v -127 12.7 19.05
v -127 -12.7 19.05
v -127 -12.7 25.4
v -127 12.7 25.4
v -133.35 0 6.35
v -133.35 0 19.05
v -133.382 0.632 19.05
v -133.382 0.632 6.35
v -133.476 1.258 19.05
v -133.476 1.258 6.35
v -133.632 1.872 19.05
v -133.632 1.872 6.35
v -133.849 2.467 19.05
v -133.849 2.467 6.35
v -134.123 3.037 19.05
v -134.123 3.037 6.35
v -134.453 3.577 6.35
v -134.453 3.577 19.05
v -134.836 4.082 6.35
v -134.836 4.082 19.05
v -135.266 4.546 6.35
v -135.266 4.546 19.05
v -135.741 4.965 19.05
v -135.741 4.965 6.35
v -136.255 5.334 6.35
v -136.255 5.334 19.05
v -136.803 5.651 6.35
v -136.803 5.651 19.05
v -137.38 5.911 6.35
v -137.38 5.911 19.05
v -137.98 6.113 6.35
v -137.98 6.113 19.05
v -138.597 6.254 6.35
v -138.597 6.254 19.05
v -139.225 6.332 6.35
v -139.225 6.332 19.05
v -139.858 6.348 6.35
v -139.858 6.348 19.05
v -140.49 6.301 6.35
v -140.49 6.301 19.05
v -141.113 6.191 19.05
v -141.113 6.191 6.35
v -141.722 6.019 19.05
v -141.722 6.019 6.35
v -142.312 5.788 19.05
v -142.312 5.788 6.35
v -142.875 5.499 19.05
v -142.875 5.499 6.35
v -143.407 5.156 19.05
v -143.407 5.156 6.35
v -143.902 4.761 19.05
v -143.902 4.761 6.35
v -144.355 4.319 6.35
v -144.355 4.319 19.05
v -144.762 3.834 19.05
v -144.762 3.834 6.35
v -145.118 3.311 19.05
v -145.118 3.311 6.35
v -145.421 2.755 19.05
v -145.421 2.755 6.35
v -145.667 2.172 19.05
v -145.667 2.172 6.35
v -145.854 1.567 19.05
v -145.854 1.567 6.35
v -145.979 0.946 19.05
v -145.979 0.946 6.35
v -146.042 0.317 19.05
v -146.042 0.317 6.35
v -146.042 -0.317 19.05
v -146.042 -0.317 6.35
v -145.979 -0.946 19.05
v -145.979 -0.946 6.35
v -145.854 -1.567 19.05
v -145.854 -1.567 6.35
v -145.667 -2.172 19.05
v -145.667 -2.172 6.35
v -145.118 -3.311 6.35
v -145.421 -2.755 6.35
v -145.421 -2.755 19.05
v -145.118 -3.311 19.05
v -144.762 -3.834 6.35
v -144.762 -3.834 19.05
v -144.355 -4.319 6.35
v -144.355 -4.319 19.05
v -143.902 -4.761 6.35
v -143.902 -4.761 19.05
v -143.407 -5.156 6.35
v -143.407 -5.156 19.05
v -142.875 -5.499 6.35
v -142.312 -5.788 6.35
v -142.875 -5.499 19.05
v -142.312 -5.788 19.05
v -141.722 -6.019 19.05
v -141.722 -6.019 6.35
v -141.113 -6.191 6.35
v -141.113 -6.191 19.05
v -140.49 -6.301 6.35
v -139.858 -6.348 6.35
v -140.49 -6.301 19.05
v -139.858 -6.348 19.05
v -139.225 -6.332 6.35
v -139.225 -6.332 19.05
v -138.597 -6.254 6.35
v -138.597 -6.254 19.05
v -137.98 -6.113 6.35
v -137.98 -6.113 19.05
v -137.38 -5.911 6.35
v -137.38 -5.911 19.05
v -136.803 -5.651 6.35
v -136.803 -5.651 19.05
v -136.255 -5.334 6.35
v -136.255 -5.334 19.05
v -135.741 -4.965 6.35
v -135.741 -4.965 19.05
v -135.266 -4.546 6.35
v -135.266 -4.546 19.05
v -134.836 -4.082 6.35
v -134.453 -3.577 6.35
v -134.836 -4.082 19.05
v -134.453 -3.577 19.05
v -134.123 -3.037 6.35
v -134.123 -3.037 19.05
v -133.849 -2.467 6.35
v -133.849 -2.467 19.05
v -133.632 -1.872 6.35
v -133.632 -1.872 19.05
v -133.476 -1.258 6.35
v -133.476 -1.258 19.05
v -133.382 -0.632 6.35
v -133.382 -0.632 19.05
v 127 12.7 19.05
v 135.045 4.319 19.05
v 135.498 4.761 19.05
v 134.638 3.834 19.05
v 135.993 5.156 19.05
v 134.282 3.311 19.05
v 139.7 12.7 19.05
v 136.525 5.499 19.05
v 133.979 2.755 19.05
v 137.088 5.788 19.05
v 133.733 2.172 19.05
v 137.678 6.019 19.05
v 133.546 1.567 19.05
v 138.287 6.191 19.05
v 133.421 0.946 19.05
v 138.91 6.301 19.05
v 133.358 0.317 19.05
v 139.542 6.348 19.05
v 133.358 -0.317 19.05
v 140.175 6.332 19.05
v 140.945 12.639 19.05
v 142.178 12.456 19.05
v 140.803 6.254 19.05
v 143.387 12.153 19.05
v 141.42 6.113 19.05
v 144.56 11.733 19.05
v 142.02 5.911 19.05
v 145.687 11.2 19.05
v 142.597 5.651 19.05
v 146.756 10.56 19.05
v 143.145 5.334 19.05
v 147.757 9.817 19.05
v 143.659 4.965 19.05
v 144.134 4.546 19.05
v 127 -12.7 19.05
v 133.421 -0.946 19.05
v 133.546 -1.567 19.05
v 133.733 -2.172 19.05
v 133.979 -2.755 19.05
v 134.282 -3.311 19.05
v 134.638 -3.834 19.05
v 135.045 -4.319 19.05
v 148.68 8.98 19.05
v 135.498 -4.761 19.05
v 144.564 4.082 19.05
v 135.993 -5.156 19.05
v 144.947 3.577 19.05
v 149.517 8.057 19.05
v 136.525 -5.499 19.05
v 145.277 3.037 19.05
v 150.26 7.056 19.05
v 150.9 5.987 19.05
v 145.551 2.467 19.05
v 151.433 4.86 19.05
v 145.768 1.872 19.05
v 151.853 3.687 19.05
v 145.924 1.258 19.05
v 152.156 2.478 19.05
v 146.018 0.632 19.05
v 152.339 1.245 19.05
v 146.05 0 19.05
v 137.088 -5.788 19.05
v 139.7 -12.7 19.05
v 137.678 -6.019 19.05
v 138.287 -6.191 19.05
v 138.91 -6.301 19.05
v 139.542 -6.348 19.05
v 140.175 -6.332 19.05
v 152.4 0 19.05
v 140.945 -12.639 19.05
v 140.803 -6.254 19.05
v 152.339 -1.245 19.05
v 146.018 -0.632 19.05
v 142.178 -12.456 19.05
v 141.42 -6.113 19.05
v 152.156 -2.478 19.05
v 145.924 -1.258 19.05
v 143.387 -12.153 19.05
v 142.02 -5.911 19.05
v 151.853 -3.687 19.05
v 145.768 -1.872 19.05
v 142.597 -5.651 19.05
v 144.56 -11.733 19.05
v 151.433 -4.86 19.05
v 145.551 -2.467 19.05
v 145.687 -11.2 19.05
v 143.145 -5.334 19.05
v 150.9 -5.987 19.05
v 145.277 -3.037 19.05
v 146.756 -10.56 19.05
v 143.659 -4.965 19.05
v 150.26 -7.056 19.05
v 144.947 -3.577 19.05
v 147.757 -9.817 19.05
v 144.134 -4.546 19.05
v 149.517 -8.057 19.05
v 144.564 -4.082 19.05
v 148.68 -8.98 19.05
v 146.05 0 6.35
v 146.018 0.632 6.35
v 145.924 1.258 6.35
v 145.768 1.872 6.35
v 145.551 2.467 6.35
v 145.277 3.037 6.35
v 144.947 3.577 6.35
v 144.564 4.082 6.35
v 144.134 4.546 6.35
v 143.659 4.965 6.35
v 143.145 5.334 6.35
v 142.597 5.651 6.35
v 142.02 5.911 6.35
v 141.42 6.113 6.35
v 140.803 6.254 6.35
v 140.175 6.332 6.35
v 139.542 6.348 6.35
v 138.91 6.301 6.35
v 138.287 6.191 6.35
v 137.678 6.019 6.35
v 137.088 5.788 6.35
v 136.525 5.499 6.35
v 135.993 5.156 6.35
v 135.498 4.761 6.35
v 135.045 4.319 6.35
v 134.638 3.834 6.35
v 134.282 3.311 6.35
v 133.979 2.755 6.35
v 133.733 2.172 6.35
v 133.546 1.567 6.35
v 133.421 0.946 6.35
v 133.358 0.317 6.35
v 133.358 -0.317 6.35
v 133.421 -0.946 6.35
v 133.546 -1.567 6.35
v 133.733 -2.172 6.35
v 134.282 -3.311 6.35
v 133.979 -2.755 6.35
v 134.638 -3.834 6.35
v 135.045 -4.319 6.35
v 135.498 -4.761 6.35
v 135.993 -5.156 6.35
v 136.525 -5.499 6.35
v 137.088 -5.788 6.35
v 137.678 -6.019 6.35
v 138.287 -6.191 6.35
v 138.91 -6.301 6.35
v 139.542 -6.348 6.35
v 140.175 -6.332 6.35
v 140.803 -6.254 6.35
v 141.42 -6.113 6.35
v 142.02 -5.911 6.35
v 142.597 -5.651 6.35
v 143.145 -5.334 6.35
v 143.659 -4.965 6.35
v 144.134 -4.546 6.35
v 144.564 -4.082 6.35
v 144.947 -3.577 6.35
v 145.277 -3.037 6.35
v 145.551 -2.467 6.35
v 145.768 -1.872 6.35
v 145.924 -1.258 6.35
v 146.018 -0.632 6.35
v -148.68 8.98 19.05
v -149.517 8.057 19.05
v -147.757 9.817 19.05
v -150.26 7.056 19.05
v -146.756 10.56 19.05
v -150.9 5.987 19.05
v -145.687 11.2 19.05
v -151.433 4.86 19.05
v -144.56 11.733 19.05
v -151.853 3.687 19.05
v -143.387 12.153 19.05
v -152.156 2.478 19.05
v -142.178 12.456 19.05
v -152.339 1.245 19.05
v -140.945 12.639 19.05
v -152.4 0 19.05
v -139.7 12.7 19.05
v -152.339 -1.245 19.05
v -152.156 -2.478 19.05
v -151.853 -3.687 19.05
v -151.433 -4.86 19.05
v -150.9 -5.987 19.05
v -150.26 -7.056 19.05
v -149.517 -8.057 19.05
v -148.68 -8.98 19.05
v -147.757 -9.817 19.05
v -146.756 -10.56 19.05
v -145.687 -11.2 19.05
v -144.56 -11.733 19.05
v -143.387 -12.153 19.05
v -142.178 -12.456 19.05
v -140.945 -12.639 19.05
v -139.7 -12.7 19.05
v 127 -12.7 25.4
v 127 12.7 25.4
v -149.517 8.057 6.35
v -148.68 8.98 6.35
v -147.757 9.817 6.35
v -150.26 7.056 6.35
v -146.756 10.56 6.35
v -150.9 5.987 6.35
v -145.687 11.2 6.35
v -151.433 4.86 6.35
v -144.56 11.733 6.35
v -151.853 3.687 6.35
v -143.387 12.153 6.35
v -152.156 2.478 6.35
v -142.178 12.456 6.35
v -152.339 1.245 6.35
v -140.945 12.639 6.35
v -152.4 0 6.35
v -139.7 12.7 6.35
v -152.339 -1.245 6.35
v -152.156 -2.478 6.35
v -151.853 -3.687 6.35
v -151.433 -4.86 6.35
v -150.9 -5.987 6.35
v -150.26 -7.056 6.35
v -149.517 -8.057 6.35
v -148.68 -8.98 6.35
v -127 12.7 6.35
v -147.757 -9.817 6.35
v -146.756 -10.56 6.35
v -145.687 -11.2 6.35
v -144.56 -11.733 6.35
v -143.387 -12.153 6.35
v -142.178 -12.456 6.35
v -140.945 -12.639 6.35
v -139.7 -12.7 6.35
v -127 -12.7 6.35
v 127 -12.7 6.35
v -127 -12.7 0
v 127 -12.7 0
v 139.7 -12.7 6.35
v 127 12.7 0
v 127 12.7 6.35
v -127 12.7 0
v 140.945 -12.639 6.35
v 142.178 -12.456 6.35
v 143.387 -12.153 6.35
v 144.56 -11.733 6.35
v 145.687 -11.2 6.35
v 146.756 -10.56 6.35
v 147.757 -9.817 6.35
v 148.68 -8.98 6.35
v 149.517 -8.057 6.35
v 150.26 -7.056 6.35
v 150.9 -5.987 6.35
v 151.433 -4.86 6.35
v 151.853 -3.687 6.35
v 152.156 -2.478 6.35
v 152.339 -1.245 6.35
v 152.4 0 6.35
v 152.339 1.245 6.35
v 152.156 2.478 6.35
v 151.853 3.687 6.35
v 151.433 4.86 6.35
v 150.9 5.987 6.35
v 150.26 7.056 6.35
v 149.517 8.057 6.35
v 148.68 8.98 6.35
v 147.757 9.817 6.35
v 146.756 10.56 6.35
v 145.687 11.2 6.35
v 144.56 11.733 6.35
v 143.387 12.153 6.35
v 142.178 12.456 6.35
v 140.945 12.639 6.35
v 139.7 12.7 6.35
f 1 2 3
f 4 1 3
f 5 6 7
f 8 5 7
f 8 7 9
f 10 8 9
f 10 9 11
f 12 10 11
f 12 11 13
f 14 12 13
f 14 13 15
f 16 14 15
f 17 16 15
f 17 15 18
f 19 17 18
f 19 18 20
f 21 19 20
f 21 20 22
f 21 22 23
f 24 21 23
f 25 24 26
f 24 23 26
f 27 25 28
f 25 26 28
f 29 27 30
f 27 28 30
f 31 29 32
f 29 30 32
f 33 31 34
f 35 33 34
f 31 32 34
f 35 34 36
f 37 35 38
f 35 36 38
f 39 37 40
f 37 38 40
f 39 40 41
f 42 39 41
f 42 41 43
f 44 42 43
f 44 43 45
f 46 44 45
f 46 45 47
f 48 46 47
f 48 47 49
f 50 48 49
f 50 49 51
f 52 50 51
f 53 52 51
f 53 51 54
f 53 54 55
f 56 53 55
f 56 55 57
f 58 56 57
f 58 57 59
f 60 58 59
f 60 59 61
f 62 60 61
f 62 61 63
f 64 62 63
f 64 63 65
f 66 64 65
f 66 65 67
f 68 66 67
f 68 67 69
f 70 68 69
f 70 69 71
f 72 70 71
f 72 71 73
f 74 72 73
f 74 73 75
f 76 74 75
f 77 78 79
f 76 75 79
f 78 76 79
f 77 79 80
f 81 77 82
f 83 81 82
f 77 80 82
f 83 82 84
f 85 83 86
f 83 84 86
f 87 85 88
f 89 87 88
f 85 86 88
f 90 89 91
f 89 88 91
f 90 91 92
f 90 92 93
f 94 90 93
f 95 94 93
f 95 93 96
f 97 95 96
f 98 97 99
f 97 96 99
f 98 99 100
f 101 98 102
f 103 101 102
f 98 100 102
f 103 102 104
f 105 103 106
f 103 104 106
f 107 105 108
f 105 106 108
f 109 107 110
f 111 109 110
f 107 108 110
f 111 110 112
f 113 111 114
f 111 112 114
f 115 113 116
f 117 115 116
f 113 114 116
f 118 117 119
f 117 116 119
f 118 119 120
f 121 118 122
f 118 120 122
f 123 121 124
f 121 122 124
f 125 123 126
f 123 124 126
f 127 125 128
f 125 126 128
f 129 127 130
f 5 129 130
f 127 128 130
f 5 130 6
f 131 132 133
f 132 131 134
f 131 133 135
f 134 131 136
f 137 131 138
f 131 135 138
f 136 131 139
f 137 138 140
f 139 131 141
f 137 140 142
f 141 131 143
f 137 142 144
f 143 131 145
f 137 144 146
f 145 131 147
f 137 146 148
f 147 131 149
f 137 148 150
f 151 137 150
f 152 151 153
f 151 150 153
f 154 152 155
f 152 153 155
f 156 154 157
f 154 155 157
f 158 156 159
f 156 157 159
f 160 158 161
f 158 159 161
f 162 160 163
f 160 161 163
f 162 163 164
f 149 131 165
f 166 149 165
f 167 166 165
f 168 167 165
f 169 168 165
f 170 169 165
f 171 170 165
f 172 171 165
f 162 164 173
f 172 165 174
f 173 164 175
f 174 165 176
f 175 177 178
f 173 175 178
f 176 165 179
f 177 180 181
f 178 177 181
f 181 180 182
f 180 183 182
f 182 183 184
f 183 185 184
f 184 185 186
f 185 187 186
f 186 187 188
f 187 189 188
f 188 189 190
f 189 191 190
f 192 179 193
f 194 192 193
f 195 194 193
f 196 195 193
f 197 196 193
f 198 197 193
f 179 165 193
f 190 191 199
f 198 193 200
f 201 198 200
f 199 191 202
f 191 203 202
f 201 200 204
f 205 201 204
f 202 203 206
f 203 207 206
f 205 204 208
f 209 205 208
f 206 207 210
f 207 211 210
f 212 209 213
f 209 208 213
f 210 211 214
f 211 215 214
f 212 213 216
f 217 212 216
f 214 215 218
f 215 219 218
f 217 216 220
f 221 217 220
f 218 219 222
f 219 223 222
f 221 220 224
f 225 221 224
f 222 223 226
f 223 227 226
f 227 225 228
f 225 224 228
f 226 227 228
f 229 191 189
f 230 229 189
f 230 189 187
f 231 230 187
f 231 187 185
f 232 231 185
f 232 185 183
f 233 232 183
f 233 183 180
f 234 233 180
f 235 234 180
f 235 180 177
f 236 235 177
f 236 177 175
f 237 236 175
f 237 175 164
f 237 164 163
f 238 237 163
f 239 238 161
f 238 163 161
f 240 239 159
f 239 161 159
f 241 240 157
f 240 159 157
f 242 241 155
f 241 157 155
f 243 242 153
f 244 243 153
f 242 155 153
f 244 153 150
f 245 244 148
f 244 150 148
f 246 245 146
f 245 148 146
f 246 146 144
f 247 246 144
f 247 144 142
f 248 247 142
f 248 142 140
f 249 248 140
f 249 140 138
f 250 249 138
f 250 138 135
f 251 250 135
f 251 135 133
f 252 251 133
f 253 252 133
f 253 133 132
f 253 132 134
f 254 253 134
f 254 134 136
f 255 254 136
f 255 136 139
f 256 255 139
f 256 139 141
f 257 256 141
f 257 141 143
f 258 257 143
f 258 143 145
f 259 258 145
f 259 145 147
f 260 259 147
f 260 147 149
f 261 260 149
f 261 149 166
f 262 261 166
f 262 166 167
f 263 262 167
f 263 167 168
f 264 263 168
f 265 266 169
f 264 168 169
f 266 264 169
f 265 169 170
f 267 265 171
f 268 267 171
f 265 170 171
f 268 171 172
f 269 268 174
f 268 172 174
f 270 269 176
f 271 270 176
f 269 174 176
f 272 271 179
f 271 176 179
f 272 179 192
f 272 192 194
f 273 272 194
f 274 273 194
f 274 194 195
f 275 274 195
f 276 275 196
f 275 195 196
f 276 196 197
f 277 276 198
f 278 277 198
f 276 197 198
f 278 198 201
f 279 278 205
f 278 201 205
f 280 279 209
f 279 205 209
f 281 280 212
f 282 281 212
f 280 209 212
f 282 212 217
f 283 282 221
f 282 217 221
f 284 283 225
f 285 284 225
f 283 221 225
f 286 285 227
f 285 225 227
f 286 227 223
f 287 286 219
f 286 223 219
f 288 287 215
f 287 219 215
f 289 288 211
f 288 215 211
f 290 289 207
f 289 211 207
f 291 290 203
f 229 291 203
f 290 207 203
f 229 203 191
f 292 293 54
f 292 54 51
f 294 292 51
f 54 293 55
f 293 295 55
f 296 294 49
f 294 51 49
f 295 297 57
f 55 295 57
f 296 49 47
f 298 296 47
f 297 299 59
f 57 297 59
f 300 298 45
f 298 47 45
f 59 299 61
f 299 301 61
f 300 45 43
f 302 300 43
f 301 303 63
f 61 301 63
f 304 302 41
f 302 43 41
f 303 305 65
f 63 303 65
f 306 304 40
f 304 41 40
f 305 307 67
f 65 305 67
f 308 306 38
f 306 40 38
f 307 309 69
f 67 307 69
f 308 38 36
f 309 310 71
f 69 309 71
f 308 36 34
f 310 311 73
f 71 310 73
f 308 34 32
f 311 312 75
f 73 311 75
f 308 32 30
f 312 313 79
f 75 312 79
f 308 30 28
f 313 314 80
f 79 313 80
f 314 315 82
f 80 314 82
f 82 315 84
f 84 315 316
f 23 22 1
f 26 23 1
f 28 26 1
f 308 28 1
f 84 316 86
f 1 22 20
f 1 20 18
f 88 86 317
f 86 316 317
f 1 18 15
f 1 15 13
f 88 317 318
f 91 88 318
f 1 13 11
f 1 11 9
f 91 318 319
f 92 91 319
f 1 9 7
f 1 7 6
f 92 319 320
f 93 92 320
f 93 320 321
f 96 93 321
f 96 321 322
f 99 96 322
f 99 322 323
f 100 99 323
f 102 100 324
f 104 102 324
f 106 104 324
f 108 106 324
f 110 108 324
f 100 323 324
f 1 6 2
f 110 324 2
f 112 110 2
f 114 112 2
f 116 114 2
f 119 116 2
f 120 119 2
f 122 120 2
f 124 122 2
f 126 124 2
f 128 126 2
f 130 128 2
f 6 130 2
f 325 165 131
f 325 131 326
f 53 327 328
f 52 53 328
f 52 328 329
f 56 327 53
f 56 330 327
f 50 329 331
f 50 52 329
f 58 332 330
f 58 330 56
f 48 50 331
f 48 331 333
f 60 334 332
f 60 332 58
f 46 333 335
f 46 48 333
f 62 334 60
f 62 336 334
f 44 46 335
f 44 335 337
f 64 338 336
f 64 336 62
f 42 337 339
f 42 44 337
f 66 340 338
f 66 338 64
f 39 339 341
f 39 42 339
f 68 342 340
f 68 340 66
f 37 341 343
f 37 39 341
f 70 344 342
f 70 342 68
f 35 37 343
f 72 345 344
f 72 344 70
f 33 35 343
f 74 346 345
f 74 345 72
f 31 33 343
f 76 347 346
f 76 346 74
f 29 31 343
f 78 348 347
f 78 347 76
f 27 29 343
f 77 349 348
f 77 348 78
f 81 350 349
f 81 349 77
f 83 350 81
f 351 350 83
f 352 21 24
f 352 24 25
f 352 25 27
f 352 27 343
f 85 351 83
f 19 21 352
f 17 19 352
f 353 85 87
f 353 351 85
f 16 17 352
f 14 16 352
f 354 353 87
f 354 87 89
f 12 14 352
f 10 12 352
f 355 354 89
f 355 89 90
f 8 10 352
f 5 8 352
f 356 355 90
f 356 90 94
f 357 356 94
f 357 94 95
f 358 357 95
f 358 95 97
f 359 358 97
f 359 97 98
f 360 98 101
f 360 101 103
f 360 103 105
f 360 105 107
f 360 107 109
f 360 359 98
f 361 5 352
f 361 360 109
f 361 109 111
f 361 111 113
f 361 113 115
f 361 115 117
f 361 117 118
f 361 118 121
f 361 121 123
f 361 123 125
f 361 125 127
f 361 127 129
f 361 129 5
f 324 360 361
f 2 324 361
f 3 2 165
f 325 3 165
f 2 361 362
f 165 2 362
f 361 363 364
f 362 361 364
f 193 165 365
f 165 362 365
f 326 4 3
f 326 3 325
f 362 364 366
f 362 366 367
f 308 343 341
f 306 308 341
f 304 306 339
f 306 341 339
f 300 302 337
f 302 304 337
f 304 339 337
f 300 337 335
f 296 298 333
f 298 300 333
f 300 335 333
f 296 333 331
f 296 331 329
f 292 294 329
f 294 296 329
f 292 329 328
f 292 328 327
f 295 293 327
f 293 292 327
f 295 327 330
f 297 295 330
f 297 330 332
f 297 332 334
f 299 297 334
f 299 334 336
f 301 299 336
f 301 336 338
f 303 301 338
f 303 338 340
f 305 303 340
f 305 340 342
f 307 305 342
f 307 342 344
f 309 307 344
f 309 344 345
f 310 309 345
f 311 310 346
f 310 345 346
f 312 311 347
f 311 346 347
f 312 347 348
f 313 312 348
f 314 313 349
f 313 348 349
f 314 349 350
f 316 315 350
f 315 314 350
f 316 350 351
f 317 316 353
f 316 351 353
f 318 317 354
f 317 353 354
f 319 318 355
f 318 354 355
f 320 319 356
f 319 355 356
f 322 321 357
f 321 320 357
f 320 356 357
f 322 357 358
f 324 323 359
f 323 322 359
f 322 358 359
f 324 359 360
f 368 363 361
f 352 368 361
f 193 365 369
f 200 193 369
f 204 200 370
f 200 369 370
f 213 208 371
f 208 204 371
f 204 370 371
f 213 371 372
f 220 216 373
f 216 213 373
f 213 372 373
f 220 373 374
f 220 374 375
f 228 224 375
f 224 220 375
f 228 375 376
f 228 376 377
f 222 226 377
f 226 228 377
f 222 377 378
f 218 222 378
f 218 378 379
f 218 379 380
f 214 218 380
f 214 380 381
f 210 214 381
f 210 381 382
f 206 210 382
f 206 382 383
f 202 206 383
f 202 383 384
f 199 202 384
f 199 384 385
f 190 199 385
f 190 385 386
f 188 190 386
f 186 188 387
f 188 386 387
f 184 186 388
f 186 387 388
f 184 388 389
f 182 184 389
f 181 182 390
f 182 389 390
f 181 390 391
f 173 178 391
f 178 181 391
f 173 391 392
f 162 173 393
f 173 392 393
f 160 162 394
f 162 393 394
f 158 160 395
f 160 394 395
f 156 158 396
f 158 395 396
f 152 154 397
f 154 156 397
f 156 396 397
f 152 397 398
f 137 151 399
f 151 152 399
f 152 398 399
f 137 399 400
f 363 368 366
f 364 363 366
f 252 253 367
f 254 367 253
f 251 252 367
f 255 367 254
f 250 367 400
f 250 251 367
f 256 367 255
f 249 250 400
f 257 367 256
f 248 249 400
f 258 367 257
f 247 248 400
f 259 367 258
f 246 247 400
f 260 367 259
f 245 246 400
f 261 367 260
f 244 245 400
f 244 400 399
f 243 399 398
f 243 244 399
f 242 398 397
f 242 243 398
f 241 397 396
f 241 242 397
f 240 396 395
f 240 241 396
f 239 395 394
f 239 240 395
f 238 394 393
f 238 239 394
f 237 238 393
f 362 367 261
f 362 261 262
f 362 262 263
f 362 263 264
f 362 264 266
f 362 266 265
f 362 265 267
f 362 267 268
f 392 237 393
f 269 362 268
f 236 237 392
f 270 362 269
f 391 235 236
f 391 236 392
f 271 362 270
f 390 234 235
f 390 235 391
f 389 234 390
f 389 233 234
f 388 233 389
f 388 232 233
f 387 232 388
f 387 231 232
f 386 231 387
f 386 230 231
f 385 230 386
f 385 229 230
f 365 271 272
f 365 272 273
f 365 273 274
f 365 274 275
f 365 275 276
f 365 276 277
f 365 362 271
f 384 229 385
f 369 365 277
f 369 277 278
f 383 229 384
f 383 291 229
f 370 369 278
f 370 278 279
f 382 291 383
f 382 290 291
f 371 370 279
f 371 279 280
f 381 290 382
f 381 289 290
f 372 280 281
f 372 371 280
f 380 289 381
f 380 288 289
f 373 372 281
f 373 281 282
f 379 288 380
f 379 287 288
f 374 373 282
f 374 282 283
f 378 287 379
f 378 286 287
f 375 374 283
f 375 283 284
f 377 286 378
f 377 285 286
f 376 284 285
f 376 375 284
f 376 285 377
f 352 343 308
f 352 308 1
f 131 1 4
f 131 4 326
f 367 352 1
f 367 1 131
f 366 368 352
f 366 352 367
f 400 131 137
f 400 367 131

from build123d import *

# Parameters (mm, degrees)
F0_W     = 279.4
F0_H     = 25.4
F1_DEPTH = 25.4
F2_R     = 6.35
F3_DEPTH = 25.4
F4_W     = 152.4
F4_H     = 6.35
F5_DEPTH = 25.401


with BuildPart() as f1:
    # F0 (on Top) → F1 (new body)
    with BuildSketch(Plane.XY):
        Rectangle(F0_W, F0_H)
        with BuildLine():
            Line((139.7, 12.7), (139.7, -12.7))
            ThreePointArc((139.7, -12.7), (152.4, 0), (139.7, 12.7))
        make_face()
        with BuildLine():
            ThreePointArc((-139.7, 12.7), (-152.4, 0), (-139.7, -12.7))
            Line((-139.7, -12.7), (-139.7, 12.7))
        make_face()
    extrude(amount=F1_DEPTH)

    # F2 (on face) → F3 (cut, through all)
    with BuildSketch(Plane.XY.offset(25.4)):
        with Locations((-139.7, 0)):
            Circle(F2_R)
        with Locations((139.7, 0)):
            Circle(F2_R)
    extrude(amount=-F3_DEPTH, mode=Mode.SUBTRACT)

    # F4 (on face) → F5 (cut, through all)
    with BuildSketch(Plane.XZ.offset(12.7)):
        with Locations((-203.2, 22.225)):
            Rectangle(F4_W, F4_H)
        with Locations((-203.2, 3.175)):
            Rectangle(F4_W, F4_H)
        with Locations((203.2, 22.225)):
            Rectangle(F4_W, F4_H)
        with Locations((203.2, 3.175)):
            Rectangle(F4_W, F4_H)
    extrude(amount=-F5_DEPTH, mode=Mode.SUBTRACT)


solid = f1.part
